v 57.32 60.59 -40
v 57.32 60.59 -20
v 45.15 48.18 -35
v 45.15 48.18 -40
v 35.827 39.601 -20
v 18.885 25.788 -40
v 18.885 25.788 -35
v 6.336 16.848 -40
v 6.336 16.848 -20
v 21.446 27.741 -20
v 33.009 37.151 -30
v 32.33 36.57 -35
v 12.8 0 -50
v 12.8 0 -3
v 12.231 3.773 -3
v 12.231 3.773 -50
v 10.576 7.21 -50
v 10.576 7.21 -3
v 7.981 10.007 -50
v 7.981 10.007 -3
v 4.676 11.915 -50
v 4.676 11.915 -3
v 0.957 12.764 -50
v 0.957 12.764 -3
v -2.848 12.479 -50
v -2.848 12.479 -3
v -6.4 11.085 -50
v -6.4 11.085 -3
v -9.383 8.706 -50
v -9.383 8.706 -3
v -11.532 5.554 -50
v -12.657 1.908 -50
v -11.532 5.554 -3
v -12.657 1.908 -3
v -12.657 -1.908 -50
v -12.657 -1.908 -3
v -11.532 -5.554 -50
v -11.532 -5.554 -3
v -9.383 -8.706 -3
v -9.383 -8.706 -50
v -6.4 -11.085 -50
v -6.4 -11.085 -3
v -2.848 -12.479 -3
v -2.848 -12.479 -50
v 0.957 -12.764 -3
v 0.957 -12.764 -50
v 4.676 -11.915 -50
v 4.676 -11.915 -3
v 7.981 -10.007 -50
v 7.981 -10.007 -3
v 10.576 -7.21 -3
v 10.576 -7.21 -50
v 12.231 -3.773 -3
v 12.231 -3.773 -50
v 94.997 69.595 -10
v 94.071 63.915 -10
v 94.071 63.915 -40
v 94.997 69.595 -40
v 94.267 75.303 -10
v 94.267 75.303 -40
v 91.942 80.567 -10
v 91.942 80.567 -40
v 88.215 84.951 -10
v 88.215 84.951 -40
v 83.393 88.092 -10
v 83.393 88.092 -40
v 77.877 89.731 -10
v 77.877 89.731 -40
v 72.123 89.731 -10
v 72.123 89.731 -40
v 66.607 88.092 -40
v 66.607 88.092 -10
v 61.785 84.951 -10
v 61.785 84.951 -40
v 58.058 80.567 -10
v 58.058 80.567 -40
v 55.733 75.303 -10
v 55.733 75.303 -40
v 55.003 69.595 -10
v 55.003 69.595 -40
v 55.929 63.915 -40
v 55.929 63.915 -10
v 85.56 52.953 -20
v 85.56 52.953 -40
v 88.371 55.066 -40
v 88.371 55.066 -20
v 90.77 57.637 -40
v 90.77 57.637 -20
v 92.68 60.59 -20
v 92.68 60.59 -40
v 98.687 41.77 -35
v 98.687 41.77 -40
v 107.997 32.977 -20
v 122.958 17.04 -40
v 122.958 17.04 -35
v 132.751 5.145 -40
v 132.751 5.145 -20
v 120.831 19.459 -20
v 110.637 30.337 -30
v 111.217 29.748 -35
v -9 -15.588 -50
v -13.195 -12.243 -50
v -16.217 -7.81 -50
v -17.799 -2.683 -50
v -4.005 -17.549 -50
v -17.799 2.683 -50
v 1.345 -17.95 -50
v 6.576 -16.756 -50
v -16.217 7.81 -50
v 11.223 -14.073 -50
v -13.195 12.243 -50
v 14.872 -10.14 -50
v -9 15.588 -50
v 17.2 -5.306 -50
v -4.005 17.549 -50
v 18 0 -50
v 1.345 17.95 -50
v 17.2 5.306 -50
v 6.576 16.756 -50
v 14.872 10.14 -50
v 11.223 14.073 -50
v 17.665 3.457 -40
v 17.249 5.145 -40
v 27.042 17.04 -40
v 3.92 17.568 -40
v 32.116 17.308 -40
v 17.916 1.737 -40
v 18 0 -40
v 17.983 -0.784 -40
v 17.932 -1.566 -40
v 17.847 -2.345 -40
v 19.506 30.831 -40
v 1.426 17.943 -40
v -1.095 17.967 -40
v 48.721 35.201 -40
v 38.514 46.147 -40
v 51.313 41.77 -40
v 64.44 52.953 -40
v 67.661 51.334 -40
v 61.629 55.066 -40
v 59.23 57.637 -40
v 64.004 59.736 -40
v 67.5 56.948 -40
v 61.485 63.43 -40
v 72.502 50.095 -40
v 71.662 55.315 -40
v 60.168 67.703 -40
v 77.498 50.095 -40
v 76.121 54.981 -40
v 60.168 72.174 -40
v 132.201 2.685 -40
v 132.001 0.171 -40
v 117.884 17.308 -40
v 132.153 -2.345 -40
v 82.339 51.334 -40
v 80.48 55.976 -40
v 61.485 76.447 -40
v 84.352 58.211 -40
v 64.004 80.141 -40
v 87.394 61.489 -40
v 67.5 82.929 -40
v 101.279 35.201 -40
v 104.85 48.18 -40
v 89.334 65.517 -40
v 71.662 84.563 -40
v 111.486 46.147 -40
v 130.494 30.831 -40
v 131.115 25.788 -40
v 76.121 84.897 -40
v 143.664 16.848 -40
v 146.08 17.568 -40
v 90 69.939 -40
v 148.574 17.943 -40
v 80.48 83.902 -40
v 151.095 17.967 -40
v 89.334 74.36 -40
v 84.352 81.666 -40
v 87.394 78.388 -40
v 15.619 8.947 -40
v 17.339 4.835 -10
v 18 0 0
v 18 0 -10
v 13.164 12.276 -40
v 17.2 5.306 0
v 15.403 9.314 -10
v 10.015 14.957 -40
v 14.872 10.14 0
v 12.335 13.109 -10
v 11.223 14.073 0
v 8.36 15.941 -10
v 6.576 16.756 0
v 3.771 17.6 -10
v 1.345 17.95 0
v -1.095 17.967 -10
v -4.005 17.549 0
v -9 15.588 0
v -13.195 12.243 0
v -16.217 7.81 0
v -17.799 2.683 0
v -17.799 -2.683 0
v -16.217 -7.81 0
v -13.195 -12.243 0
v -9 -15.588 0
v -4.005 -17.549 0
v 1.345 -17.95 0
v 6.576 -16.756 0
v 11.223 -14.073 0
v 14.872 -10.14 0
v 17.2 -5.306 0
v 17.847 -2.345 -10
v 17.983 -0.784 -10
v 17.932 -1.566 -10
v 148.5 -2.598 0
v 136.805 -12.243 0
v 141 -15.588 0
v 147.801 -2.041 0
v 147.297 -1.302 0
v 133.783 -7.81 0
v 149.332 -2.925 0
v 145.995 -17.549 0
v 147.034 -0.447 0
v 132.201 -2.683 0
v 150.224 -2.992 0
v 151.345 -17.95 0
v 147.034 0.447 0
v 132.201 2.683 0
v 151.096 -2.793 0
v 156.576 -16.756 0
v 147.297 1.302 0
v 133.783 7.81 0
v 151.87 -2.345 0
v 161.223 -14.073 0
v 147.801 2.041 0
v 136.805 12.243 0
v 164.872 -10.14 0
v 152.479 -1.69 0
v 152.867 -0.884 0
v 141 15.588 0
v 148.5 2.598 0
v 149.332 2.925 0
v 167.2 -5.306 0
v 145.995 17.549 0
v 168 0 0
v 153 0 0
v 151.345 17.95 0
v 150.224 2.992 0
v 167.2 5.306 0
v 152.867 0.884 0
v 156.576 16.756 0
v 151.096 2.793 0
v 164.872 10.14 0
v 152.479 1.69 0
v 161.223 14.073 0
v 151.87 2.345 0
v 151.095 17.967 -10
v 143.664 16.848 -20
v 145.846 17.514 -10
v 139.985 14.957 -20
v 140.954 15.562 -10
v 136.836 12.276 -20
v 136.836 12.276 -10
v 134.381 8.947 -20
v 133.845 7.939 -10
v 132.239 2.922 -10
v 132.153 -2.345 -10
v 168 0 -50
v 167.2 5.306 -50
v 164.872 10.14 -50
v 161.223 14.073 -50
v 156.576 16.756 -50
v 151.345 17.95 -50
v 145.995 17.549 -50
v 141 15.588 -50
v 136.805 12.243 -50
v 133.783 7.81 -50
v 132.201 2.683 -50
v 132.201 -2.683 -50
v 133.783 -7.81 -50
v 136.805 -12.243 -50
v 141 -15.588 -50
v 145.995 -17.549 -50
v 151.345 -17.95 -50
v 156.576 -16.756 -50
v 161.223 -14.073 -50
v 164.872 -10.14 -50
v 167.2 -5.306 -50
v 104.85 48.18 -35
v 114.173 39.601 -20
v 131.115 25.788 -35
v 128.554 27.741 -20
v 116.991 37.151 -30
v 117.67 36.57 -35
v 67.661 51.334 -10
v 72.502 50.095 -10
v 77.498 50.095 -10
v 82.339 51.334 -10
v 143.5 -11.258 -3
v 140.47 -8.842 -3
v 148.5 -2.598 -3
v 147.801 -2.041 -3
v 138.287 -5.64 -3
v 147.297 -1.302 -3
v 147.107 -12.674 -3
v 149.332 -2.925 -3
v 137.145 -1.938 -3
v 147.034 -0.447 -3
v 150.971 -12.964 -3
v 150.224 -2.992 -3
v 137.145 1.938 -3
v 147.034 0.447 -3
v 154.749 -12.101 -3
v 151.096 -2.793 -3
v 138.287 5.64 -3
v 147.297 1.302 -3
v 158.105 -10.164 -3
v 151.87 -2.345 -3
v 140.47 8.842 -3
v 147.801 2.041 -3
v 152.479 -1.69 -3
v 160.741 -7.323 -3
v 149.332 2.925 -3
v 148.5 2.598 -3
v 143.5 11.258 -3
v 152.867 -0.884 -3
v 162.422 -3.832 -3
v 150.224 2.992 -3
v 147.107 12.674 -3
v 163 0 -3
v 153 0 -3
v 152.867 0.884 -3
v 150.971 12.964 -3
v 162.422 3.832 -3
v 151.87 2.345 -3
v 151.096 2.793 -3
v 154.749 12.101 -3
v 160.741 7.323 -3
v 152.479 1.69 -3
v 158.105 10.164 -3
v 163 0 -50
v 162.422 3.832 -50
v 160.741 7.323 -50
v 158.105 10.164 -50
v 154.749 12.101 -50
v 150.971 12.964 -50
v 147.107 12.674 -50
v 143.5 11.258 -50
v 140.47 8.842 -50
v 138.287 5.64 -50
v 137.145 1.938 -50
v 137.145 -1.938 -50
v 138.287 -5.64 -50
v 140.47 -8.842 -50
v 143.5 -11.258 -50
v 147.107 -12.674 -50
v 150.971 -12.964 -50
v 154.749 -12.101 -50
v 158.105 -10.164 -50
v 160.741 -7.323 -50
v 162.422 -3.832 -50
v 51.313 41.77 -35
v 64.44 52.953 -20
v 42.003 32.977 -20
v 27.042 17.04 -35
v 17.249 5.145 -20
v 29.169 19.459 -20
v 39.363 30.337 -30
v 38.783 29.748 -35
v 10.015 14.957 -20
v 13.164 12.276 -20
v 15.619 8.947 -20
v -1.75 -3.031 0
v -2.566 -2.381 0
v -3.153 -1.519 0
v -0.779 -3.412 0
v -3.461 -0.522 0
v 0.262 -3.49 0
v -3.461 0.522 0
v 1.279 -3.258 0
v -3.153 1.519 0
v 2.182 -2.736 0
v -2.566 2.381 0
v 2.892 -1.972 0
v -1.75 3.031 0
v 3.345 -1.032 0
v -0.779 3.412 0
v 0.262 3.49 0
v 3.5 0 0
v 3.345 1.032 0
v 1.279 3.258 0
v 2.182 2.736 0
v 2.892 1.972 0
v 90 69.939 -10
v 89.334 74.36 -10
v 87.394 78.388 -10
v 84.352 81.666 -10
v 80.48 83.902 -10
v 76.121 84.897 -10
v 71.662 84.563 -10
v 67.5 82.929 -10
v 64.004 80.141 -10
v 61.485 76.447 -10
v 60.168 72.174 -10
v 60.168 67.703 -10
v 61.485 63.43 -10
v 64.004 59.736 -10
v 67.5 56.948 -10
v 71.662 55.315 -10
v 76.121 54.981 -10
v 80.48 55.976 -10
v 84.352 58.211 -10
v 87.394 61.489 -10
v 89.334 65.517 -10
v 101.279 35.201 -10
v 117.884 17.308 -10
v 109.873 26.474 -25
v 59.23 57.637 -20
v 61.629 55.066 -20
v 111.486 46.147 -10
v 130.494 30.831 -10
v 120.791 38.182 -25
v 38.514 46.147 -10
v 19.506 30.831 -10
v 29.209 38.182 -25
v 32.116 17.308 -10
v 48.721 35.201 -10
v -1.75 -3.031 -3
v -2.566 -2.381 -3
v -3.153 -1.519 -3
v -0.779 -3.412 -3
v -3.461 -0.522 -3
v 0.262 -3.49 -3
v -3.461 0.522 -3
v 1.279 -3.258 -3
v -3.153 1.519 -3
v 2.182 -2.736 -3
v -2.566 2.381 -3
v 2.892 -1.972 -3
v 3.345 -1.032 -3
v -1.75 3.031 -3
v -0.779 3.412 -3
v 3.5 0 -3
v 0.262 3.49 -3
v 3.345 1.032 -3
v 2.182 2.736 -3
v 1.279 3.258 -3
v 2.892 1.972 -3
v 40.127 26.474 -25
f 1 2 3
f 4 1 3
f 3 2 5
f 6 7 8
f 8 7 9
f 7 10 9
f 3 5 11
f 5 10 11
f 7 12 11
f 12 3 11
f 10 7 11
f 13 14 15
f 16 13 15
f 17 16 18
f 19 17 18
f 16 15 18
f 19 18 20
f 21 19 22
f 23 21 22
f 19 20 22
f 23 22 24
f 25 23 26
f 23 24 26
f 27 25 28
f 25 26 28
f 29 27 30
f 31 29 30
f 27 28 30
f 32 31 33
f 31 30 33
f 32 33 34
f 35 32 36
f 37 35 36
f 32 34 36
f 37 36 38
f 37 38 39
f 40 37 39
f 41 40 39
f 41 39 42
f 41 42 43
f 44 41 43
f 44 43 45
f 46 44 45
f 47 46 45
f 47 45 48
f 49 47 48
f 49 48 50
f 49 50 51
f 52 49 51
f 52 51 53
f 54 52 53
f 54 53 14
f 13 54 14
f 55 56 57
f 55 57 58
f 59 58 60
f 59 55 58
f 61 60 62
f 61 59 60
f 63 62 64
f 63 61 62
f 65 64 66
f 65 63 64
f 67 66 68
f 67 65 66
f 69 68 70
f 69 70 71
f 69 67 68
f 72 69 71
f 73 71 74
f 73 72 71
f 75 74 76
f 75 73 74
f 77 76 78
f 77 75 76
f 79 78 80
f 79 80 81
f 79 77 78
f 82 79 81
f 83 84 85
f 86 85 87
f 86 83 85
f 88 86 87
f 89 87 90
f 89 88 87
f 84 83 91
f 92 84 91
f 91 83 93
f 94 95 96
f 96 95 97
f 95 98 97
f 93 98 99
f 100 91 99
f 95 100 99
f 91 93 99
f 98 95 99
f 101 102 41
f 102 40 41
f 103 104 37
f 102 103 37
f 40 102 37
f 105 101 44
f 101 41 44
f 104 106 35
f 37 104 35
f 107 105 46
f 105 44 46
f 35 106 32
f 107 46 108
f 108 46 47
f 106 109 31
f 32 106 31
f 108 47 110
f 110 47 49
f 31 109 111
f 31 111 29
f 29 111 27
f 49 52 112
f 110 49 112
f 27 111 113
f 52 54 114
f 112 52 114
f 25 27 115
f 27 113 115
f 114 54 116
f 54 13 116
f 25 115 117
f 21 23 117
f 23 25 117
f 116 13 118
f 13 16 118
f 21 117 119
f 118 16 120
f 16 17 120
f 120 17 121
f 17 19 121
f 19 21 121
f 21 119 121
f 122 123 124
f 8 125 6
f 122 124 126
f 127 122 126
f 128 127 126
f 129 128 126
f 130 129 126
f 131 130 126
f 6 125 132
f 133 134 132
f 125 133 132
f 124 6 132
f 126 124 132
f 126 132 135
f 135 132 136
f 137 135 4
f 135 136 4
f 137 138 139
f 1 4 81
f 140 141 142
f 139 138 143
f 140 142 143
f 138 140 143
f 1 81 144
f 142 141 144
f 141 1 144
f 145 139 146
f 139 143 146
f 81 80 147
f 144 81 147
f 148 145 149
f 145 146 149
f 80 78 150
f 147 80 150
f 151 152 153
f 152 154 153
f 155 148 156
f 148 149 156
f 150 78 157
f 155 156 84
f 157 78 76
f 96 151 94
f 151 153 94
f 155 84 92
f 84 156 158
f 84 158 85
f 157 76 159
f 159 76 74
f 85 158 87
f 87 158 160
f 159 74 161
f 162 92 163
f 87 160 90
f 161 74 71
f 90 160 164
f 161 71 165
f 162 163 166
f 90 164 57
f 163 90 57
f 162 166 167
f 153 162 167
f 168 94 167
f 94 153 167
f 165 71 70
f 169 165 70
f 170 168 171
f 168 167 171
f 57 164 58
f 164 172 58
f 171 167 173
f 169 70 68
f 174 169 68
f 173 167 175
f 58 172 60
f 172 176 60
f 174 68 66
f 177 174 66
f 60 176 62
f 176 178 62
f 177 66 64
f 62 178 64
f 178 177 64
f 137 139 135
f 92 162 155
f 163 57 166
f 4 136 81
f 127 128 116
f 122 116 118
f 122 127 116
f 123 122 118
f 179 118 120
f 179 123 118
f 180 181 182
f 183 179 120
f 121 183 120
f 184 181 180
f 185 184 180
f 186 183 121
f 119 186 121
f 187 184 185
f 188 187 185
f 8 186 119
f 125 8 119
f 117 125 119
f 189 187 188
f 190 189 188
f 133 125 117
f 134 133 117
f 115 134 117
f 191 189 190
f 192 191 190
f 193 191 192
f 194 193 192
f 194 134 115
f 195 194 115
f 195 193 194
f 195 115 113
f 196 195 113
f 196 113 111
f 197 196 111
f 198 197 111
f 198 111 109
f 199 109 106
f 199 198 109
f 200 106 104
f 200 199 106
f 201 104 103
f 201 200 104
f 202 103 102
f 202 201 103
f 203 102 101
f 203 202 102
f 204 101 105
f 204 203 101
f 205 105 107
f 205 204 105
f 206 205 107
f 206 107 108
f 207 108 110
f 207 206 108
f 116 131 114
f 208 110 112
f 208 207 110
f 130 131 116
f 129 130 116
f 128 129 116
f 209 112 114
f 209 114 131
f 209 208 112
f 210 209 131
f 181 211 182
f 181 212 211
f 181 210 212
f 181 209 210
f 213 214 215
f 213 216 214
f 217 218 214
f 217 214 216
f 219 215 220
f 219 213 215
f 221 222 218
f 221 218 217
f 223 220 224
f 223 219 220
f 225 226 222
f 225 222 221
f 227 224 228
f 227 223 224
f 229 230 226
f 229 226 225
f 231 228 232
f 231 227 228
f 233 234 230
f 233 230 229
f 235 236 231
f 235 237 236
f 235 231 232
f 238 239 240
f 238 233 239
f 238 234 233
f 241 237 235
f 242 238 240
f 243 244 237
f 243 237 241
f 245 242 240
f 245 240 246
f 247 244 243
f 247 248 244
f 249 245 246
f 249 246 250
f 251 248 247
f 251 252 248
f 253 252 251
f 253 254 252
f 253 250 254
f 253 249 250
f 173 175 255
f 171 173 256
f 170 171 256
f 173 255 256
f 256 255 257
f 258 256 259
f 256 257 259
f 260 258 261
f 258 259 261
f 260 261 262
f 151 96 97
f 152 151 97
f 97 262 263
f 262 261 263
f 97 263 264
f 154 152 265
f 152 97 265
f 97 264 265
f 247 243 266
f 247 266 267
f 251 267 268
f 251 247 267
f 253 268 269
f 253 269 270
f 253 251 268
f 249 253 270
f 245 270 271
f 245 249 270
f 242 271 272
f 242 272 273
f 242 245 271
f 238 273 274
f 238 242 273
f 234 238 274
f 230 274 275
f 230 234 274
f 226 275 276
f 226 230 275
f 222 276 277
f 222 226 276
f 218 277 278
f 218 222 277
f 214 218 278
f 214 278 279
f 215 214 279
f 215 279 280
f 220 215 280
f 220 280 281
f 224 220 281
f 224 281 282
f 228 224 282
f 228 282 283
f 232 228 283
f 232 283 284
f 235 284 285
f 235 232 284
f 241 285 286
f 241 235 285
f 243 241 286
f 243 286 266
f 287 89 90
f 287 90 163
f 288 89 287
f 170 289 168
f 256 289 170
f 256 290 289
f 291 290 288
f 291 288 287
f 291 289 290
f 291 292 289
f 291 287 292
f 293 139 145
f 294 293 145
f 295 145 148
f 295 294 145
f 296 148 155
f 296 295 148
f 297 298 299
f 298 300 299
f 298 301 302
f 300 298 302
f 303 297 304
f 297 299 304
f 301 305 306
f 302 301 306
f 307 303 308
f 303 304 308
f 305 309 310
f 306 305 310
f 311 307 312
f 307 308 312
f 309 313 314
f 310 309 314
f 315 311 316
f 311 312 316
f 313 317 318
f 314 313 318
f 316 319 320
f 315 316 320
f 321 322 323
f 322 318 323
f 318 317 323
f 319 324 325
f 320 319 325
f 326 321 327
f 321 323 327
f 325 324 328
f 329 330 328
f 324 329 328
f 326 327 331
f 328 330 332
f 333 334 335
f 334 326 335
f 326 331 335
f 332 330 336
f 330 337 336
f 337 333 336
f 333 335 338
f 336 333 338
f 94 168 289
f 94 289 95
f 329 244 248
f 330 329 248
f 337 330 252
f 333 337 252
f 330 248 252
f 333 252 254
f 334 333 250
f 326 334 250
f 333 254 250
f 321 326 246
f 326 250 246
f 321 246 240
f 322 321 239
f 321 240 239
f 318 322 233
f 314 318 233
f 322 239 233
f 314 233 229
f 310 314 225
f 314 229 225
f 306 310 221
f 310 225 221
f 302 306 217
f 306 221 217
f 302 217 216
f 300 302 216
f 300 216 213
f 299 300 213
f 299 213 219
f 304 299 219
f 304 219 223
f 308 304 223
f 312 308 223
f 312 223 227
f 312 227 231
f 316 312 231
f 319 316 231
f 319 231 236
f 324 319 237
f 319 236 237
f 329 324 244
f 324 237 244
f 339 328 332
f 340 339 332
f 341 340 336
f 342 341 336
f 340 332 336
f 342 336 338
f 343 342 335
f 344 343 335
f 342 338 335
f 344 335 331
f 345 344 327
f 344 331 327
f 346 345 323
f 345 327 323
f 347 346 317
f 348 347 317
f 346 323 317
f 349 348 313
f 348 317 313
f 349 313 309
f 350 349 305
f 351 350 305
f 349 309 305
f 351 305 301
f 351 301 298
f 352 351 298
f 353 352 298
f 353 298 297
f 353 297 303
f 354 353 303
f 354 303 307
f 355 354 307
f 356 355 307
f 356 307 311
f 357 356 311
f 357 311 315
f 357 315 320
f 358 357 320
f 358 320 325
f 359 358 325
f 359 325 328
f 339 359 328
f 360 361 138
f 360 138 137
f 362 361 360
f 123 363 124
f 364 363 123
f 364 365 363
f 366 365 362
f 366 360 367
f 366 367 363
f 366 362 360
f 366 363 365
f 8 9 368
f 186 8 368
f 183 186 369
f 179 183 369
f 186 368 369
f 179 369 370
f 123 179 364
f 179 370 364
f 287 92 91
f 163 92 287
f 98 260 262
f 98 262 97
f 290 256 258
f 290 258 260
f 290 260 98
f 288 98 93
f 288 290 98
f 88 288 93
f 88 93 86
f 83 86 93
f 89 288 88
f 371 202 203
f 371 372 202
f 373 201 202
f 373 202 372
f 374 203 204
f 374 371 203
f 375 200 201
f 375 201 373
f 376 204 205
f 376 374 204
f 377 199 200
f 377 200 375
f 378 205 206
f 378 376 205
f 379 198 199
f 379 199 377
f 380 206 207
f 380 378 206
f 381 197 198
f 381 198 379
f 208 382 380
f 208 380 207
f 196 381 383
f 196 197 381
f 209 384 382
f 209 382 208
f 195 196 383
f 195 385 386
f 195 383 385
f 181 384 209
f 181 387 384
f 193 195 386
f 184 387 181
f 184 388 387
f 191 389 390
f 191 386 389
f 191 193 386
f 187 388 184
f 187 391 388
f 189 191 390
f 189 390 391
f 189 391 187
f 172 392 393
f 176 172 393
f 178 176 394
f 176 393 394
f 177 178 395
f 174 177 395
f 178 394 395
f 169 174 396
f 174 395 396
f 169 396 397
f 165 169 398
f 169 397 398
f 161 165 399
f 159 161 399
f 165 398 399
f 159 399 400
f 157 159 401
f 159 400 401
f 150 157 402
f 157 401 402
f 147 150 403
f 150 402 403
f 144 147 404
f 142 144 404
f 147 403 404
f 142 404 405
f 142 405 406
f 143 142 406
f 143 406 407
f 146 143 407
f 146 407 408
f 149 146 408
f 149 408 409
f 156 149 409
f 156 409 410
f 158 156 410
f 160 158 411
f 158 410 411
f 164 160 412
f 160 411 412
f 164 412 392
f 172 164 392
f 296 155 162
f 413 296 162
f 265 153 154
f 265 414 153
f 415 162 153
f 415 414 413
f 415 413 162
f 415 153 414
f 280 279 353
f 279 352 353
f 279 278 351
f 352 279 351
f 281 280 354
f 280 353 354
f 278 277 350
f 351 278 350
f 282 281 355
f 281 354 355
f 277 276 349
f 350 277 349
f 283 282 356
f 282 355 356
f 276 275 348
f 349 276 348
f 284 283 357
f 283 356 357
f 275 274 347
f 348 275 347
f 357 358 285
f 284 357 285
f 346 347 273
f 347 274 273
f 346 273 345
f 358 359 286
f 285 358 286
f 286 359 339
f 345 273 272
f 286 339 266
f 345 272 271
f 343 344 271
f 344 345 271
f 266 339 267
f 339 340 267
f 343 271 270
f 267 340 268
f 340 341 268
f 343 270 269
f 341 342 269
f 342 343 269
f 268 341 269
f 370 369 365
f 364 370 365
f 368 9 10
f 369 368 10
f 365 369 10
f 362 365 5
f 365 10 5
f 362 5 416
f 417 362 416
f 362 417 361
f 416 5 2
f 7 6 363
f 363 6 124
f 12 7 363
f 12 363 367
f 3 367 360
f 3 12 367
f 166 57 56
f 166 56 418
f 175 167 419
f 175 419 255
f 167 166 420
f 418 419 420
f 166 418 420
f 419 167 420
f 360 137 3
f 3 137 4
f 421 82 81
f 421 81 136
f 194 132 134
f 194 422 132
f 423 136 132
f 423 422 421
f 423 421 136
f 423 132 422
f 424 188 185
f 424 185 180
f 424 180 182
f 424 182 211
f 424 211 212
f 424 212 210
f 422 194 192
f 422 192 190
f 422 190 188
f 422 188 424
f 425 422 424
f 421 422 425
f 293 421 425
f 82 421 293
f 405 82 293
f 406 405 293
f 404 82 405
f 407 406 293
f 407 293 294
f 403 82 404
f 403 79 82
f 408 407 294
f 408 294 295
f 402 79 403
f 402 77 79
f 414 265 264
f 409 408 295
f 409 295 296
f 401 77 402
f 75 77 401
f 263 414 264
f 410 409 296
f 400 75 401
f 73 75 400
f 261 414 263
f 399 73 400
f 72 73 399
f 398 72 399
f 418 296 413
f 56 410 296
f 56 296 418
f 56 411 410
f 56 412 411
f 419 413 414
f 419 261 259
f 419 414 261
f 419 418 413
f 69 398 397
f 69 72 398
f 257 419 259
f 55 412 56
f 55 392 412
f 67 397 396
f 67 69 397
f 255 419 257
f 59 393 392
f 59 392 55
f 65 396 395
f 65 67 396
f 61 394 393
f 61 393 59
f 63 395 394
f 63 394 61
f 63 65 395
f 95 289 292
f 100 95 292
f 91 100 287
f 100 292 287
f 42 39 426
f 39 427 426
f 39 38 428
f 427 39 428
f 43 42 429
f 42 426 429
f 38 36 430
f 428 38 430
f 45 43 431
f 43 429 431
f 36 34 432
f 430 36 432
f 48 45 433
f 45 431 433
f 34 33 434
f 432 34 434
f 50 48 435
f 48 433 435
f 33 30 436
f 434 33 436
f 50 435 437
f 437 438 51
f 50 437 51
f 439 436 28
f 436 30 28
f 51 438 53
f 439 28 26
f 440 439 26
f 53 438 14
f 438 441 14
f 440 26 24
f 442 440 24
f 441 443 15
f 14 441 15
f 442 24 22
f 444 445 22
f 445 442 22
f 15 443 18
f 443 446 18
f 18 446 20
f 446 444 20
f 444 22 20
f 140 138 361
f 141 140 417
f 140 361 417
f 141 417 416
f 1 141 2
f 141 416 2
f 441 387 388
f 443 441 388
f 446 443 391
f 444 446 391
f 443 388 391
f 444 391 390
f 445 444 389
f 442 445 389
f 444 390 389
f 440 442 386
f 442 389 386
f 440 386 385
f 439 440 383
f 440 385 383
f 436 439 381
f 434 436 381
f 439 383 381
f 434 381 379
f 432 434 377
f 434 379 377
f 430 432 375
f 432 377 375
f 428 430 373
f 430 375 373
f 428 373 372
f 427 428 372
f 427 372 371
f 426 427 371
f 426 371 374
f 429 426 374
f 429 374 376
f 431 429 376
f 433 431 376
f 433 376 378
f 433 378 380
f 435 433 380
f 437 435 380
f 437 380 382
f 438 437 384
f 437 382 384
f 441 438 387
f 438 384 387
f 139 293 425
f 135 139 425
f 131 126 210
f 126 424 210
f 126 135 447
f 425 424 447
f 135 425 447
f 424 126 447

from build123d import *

# Parameters (mm, degrees)
SKETCH1_R           = 18
SKETCH1_R_2         = 12.8
BOSS_EXTRUDE1_DEPTH = 50
SKETCH2_R           = 12.8
SKETCH2_R_2         = 3.5
BOSS_EXTRUDE2_DEPTH = 3
SKETCH4_R           = 20
SKETCH4_R_2         = 15
BOSS_EXTRUDE3_DEPTH = 30
BOSS_EXTRUDE4_START = -30
BOSS_EXTRUDE4_DEPTH = 30
CUT_EXTRUDE1_START  = -20
CUT_EXTRUDE1_DEPTH  = 20
BOSS_EXTRUDE5_DEPTH = 5
SKETCH9_R           = 18
SKETCH9_R_2         = 13
BOSS_EXTRUDE6_DEPTH = 50
SKETCH10_R          = 13
SKETCH10_R_2        = 3
BOSS_EXTRUDE7_DEPTH = 3


with BuildPart() as part:
    # Sketch1 → Boss-Extrude1 (new body)
    with BuildSketch(Plane.XY):
        Circle(SKETCH1_R)
        Circle(SKETCH1_R_2, mode=Mode.SUBTRACT)
    extrude(amount=-BOSS_EXTRUDE1_DEPTH)

    # Sketch2 → Boss-Extrude2 (add)
    with BuildSketch(Plane.XY):
        Circle(SKETCH2_R)
        Circle(SKETCH2_R_2, mode=Mode.SUBTRACT)
    extrude(amount=-BOSS_EXTRUDE2_DEPTH)



with BuildPart() as body_2:
    # Sketch4 → Boss-Extrude3 (new body)
    with BuildSketch(Plane.XY.offset(-10)):
        with Locations((75, 69.93863146)):
            Circle(SKETCH4_R)
        with Locations((75, 69.93863146)):
            Circle(SKETCH4_R_2, mode=Mode.SUBTRACT)
    extrude(amount=-BOSS_EXTRUDE3_DEPTH)


with BuildPart() as part_1:
    add(part.part)

    add(body_2.part)  # Boss-Extrude4 merges body 2
    # Sketch6 → Boss-Extrude4 (add)
    with BuildSketch(Plane(origin=(0, 0, -40), x_dir=(-1, 0, 0), z_dir=(0, 0, -1)).offset(BOSS_EXTRUDE4_START)):
        with BuildLine():
            ThreePointArc((-67.66111339, 51.333773403), (-60.372925968, 56.298664259), (-55.928527591, 63.915431302))
            add(Edge.make_bspline(
                [(-55.928527591, 63.915431302), (-31.001096906, 35.423888035), (1.094833513, 17.966673025)],
                knots=[0, 0, 0, 0.881213021, 0.881213021, 0.881213021], degree=2))
            ThreePointArc((1.094833513, 17.966673025), (-13.164366629, 12.275970481), (-17.846535387, -2.345458309))
            add(Edge.make_bspline(
                [(-67.66111339, 51.333773403), (-37.500124426, 28.454534277), (-17.846535387, -2.345458309)],
                knots=[0, 0, 0, 0.881213021, 0.881213021, 0.881213021], degree=2))
        make_face()
    boss_extrude4 = extrude(amount=BOSS_EXTRUDE4_DEPTH)

    # Sketch7 → Cut-Extrude1 (cut)
    with BuildSketch(Plane(origin=(0, 0, -40), x_dir=(-1, 0, 0), z_dir=(0, 0, -1)).offset(CUT_EXTRUDE1_START)):
        with BuildLine():
            ThreePointArc((-64.440499884, 52.953433278), (-60.372925968, 56.298664259), (-57.319583414, 60.589681287))
            add(Edge.make_bspline(
                [(-57.319583414, 60.589681287), (-34.19078561, 35.583825238), (-6.336172913, 16.847934972)],
                knots=[0, 0, 0, 0.925026666, 0.925026666, 0.925026666], degree=2))
            ThreePointArc((-6.336172913, 16.847934972), (-13.164366629, 12.275970481), (-17.248883328, 5.145485781))
            add(Edge.make_bspline(
                [(-64.440499884, 52.953433278), (-37.882173467, 31.625296404), (-17.248883328, 5.145485781)],
                knots=[0, 0, 0, 0.925026666, 0.925026666, 0.925026666], degree=2))
        make_face()
    cut_extrude1 = extrude(amount=CUT_EXTRUDE1_DEPTH, mode=Mode.SUBTRACT)

    # Sketch8 → Boss-Extrude5 (add)
    with BuildSketch(Plane(origin=(0, 0, -40), x_dir=(-1, 0, 0), z_dir=(0, 0, -1))):
        with BuildLine():
            Line((-51.31256913, 41.769602741), (-45.149947709, 48.180305567))
            add(Edge.make_bspline(
                [(-18.885246909, 25.787533519), (-32.641608403, 36.15601403), (-45.149947709, 48.180305567)],
                knots=[0, 0, 0, 1, 1, 1], degree=2))
            Line((-18.885246909, 25.787533519), (-27.042084625, 17.040396006))
            add(Edge.make_bspline(
                [(-51.31256913, 41.769602741), (-38.388868676, 30.090544445), (-27.042084625, 17.040396006)],
                knots=[0, 0, 0, 1, 1, 1], degree=2))
        make_face()
    boss_extrude5 = extrude(amount=-BOSS_EXTRUDE5_DEPTH)

    # Mirror3: Boss-Extrude4 across plane
    add(boss_extrude4.mirror(Plane(origin=(75, 0, 0), x_dir=(0, 0, 1), z_dir=(1, 0, 0))))

    # Mirror4: Cut-Extrude1 across plane
    add(cut_extrude1.mirror(Plane(origin=(75, 0, 0), x_dir=(0, 0, 1), z_dir=(1, 0, 0))), mode=Mode.SUBTRACT)

    # Mirror5: Boss-Extrude5 across plane
    add(boss_extrude5.mirror(Plane(origin=(75, 0, 0), x_dir=(0, 0, 1), z_dir=(1, 0, 0))))


with BuildPart() as body_2_2:
    # Sketch9 → Boss-Extrude6 (new body)
    with BuildSketch(Plane.XY):
        with Locations((150, 0)):
            Circle(SKETCH9_R)
        with Locations((150, 0)):
            Circle(SKETCH9_R_2, mode=Mode.SUBTRACT)
    extrude(amount=-BOSS_EXTRUDE6_DEPTH)

    # Sketch10 → Boss-Extrude7 (add)
    with BuildSketch(Plane.XY):
        with Locations((150, 0)):
            Circle(SKETCH10_R)
        with Locations((150, 0)):
            Circle(SKETCH10_R_2, mode=Mode.SUBTRACT)
    extrude(amount=-BOSS_EXTRUDE7_DEPTH)


solid = Compound([part_1.part, body_2_2.part])
